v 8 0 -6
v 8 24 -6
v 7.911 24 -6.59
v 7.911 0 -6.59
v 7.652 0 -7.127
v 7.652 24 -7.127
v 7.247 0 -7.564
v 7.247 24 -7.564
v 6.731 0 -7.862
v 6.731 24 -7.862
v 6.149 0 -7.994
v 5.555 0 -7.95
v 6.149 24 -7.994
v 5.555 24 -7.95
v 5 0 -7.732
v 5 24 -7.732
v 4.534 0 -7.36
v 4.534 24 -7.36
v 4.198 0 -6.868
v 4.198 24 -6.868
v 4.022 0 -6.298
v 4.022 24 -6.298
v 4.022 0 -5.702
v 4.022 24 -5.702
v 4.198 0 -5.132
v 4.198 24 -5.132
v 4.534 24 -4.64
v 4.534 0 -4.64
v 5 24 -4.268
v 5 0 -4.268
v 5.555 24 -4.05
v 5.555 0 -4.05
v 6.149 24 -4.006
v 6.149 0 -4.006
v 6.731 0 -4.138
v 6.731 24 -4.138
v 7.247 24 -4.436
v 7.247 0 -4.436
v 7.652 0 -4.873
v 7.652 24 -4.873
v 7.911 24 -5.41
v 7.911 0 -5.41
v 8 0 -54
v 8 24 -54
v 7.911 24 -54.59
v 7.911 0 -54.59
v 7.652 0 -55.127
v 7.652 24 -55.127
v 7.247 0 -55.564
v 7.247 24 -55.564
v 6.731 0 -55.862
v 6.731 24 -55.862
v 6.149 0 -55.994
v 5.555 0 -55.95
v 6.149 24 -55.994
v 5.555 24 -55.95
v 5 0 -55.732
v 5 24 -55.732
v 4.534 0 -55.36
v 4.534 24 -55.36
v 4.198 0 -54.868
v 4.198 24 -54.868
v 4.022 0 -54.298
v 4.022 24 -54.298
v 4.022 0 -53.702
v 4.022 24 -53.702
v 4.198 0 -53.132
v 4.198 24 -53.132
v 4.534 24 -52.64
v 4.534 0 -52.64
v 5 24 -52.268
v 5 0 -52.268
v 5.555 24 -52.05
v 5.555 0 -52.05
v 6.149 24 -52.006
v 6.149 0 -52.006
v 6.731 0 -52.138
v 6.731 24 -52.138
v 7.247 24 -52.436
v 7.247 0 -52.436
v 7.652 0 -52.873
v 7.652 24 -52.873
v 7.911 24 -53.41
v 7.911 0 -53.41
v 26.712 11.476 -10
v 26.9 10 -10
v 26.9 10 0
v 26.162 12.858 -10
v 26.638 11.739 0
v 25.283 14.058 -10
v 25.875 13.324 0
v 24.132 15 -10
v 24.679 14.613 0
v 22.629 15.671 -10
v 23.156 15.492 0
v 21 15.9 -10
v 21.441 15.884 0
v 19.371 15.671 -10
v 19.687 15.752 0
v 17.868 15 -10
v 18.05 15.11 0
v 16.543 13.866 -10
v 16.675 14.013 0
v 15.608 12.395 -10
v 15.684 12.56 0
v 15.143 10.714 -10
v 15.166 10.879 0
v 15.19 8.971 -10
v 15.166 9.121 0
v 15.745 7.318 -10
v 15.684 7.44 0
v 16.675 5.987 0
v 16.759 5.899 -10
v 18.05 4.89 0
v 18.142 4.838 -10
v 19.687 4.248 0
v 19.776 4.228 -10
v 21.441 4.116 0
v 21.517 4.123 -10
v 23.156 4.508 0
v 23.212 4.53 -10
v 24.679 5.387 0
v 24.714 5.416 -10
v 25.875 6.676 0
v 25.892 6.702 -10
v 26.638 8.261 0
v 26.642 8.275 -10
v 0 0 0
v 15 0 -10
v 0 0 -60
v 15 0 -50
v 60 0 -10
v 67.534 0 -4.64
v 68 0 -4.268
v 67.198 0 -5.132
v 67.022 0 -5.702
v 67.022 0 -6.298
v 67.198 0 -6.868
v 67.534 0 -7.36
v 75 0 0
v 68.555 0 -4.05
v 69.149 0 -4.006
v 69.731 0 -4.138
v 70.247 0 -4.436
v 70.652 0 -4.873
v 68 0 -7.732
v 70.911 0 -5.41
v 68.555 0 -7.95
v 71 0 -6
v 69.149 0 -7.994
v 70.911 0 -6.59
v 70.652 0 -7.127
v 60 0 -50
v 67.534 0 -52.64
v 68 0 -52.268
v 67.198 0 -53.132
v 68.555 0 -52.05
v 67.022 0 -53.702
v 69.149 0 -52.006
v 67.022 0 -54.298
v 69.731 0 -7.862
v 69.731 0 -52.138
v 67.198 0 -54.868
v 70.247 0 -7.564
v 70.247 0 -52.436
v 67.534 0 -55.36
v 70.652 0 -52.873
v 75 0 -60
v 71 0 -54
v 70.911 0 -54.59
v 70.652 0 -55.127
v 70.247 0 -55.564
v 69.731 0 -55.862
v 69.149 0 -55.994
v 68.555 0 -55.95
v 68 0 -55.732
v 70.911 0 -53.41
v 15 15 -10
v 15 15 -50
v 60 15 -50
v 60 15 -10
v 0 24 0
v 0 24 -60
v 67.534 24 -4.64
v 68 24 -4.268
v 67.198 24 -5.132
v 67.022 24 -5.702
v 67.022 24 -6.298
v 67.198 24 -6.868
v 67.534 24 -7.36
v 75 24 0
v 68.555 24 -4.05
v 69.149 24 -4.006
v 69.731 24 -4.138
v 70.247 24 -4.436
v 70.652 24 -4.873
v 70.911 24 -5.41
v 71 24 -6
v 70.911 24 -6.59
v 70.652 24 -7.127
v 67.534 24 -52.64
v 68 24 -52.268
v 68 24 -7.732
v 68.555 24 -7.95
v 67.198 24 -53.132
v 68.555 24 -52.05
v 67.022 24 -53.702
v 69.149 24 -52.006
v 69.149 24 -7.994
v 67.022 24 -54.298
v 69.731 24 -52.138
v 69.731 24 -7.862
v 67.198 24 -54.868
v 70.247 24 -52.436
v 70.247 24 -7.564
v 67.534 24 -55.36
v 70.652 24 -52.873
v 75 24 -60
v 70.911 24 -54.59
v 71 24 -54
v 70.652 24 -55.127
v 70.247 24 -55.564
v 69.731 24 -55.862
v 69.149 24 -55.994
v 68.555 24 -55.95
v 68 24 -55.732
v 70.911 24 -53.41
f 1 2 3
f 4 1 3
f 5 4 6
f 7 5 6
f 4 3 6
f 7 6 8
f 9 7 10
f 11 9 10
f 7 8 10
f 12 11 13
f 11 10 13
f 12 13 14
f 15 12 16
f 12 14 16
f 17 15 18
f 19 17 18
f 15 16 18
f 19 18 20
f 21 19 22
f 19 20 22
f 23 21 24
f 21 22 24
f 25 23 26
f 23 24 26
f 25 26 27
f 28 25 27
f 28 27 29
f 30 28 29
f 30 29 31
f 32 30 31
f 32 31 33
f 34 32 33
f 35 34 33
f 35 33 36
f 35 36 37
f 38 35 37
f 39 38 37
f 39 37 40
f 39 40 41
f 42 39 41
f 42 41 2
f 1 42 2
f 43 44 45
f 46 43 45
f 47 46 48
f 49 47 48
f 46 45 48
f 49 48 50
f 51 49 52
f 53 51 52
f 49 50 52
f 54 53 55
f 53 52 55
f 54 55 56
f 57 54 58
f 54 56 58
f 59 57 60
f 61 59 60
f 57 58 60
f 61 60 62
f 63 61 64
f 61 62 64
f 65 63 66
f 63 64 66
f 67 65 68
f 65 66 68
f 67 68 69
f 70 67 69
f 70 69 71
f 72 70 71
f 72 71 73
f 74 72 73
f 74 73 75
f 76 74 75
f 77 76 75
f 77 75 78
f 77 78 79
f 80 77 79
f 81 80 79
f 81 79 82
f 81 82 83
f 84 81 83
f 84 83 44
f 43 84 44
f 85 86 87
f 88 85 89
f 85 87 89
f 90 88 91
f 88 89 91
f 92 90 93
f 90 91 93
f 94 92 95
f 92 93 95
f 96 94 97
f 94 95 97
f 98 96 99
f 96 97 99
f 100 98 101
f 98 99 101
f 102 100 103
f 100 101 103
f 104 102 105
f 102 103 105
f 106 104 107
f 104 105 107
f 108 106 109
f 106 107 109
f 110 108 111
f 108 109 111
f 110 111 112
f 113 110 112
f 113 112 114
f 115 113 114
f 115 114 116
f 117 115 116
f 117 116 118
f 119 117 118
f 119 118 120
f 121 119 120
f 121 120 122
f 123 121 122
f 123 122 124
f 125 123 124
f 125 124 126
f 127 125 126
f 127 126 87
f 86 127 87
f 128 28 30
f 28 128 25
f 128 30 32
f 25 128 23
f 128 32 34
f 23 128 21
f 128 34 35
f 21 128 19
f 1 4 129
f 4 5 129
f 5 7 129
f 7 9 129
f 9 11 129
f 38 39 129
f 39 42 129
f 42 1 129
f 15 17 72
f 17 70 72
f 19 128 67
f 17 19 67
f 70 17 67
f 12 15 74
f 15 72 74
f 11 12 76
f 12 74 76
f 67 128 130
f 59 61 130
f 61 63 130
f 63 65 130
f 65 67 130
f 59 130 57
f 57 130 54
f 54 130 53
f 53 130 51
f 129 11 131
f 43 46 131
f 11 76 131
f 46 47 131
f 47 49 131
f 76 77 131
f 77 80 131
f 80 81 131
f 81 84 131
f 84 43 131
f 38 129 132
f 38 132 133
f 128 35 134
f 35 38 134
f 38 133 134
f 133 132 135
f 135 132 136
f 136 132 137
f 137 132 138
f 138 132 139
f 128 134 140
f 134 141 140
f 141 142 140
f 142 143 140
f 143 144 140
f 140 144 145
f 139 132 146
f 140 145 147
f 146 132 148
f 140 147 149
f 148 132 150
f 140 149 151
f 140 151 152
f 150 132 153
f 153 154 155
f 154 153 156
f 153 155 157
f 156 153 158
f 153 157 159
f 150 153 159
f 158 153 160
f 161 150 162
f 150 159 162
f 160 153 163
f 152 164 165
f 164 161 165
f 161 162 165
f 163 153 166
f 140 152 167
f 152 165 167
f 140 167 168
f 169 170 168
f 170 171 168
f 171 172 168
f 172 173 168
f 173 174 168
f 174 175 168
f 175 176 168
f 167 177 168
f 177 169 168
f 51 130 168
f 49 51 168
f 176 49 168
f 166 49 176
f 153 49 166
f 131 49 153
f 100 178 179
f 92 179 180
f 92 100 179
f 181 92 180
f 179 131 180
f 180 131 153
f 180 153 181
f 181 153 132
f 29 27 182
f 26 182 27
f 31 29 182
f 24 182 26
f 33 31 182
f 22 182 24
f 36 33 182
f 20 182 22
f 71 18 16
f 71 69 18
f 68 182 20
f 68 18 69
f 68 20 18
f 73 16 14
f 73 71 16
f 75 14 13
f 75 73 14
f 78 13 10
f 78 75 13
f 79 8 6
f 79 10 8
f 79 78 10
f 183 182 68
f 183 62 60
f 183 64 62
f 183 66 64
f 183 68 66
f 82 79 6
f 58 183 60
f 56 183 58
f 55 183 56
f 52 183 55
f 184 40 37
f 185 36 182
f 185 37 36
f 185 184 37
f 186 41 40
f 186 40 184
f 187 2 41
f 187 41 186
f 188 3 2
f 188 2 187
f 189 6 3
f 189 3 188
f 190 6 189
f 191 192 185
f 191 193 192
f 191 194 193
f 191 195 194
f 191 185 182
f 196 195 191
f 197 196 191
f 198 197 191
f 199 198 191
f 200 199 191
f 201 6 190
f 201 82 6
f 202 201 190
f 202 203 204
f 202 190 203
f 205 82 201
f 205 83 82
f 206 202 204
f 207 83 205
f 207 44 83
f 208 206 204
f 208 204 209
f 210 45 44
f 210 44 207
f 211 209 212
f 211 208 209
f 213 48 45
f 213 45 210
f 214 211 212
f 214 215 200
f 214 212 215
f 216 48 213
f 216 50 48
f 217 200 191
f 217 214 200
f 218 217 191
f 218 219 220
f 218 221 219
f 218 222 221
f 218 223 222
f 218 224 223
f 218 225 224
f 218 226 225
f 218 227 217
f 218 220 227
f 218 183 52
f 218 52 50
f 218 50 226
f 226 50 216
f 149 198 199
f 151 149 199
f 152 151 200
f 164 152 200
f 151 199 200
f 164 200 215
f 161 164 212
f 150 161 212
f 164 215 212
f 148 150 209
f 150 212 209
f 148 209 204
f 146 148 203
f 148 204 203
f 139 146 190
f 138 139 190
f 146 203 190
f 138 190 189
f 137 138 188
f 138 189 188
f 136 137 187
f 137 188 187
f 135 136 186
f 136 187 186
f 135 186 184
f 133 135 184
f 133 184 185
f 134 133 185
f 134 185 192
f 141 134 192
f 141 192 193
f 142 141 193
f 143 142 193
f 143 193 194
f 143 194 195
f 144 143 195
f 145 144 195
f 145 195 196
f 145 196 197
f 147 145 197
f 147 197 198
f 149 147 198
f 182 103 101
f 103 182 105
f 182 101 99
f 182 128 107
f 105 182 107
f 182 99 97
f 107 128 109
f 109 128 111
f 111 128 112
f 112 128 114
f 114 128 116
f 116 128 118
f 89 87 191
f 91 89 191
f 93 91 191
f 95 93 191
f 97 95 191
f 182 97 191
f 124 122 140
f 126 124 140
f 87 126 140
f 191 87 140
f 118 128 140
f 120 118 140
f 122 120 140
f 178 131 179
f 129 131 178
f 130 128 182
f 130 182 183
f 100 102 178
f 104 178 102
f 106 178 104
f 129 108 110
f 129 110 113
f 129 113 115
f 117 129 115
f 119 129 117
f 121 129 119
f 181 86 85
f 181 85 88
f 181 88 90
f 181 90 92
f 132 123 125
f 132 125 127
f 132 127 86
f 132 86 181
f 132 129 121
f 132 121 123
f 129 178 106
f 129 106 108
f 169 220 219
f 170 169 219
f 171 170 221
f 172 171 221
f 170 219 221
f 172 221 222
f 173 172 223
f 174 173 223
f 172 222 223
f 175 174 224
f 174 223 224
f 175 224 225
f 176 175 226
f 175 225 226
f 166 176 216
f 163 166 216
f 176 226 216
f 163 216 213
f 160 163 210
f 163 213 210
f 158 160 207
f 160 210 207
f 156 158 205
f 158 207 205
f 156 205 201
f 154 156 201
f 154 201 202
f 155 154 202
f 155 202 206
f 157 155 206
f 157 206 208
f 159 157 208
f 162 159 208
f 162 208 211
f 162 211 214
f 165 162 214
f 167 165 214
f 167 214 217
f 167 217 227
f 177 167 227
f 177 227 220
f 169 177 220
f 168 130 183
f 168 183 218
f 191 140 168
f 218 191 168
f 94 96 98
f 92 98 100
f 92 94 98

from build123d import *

# Parameters (mm, degrees)
SKETCH1_W           = 75
SKETCH1_H           = 60
BOSS_EXTRUDE1_DEPTH = 24
SKETCH2_R           = 2
CUT_EXTRUDE1_DEPTH  = 25
SKETCH3_W           = 45
SKETCH3_H           = 40
CUT_EXTRUDE2_DEPTH  = 15
SKETCH4_R           = 5
CUT_EXTRUDE3_DEPTH  = 11
SKETCH5_R           = 5.9
CUT_EXTRUDE4_DEPTH  = 10


with BuildPart() as part:
    # Sketch1 → Boss-Extrude1 (new body)
    with BuildSketch(Plane(origin=(0, 0, 0), x_dir=(1, 0, 0), z_dir=(0, 1, 0))):
        with Locations((37.5, 30)):
            Rectangle(SKETCH1_W, SKETCH1_H)
    extrude(amount=BOSS_EXTRUDE1_DEPTH)

    # Sketch2 → Cut-Extrude1 (cut, through all)
    with BuildSketch(Plane(origin=(0, 24, 0), x_dir=(1, 0, 0), z_dir=(0, 1, 0))):
        with Locations((6, 54)):
            Circle(SKETCH2_R)
        with Locations((6, 6)):
            Circle(SKETCH2_R)
        with Locations((69, 54)):
            Circle(SKETCH2_R)
        with Locations((69, 6)):
            Circle(SKETCH2_R)
    extrude(amount=-CUT_EXTRUDE1_DEPTH, mode=Mode.SUBTRACT)

    # Sketch3 → Cut-Extrude2 (cut)
    with BuildSketch(Plane.XZ):
        with Locations((37.5, -30)):
            Rectangle(SKETCH3_W, SKETCH3_H)
    extrude(amount=-CUT_EXTRUDE2_DEPTH, mode=Mode.SUBTRACT)

    # Sketch4 → Cut-Extrude3 (cut, through all)
    with BuildSketch(Plane(origin=(0, 0, -10), x_dir=(-1, 0, 0), z_dir=(0, 0, -1))):
        with Locations((-21, 10)):
            Circle(SKETCH4_R)
    extrude(amount=-CUT_EXTRUDE3_DEPTH, mode=Mode.SUBTRACT)

    # Sketch5 → Cut-Extrude4 (cut)
    with BuildSketch(Plane.XY):
        with Locations((21, 10)):
            Circle(SKETCH5_R)
    extrude(amount=-CUT_EXTRUDE4_DEPTH, mode=Mode.SUBTRACT)


solid = part.part
